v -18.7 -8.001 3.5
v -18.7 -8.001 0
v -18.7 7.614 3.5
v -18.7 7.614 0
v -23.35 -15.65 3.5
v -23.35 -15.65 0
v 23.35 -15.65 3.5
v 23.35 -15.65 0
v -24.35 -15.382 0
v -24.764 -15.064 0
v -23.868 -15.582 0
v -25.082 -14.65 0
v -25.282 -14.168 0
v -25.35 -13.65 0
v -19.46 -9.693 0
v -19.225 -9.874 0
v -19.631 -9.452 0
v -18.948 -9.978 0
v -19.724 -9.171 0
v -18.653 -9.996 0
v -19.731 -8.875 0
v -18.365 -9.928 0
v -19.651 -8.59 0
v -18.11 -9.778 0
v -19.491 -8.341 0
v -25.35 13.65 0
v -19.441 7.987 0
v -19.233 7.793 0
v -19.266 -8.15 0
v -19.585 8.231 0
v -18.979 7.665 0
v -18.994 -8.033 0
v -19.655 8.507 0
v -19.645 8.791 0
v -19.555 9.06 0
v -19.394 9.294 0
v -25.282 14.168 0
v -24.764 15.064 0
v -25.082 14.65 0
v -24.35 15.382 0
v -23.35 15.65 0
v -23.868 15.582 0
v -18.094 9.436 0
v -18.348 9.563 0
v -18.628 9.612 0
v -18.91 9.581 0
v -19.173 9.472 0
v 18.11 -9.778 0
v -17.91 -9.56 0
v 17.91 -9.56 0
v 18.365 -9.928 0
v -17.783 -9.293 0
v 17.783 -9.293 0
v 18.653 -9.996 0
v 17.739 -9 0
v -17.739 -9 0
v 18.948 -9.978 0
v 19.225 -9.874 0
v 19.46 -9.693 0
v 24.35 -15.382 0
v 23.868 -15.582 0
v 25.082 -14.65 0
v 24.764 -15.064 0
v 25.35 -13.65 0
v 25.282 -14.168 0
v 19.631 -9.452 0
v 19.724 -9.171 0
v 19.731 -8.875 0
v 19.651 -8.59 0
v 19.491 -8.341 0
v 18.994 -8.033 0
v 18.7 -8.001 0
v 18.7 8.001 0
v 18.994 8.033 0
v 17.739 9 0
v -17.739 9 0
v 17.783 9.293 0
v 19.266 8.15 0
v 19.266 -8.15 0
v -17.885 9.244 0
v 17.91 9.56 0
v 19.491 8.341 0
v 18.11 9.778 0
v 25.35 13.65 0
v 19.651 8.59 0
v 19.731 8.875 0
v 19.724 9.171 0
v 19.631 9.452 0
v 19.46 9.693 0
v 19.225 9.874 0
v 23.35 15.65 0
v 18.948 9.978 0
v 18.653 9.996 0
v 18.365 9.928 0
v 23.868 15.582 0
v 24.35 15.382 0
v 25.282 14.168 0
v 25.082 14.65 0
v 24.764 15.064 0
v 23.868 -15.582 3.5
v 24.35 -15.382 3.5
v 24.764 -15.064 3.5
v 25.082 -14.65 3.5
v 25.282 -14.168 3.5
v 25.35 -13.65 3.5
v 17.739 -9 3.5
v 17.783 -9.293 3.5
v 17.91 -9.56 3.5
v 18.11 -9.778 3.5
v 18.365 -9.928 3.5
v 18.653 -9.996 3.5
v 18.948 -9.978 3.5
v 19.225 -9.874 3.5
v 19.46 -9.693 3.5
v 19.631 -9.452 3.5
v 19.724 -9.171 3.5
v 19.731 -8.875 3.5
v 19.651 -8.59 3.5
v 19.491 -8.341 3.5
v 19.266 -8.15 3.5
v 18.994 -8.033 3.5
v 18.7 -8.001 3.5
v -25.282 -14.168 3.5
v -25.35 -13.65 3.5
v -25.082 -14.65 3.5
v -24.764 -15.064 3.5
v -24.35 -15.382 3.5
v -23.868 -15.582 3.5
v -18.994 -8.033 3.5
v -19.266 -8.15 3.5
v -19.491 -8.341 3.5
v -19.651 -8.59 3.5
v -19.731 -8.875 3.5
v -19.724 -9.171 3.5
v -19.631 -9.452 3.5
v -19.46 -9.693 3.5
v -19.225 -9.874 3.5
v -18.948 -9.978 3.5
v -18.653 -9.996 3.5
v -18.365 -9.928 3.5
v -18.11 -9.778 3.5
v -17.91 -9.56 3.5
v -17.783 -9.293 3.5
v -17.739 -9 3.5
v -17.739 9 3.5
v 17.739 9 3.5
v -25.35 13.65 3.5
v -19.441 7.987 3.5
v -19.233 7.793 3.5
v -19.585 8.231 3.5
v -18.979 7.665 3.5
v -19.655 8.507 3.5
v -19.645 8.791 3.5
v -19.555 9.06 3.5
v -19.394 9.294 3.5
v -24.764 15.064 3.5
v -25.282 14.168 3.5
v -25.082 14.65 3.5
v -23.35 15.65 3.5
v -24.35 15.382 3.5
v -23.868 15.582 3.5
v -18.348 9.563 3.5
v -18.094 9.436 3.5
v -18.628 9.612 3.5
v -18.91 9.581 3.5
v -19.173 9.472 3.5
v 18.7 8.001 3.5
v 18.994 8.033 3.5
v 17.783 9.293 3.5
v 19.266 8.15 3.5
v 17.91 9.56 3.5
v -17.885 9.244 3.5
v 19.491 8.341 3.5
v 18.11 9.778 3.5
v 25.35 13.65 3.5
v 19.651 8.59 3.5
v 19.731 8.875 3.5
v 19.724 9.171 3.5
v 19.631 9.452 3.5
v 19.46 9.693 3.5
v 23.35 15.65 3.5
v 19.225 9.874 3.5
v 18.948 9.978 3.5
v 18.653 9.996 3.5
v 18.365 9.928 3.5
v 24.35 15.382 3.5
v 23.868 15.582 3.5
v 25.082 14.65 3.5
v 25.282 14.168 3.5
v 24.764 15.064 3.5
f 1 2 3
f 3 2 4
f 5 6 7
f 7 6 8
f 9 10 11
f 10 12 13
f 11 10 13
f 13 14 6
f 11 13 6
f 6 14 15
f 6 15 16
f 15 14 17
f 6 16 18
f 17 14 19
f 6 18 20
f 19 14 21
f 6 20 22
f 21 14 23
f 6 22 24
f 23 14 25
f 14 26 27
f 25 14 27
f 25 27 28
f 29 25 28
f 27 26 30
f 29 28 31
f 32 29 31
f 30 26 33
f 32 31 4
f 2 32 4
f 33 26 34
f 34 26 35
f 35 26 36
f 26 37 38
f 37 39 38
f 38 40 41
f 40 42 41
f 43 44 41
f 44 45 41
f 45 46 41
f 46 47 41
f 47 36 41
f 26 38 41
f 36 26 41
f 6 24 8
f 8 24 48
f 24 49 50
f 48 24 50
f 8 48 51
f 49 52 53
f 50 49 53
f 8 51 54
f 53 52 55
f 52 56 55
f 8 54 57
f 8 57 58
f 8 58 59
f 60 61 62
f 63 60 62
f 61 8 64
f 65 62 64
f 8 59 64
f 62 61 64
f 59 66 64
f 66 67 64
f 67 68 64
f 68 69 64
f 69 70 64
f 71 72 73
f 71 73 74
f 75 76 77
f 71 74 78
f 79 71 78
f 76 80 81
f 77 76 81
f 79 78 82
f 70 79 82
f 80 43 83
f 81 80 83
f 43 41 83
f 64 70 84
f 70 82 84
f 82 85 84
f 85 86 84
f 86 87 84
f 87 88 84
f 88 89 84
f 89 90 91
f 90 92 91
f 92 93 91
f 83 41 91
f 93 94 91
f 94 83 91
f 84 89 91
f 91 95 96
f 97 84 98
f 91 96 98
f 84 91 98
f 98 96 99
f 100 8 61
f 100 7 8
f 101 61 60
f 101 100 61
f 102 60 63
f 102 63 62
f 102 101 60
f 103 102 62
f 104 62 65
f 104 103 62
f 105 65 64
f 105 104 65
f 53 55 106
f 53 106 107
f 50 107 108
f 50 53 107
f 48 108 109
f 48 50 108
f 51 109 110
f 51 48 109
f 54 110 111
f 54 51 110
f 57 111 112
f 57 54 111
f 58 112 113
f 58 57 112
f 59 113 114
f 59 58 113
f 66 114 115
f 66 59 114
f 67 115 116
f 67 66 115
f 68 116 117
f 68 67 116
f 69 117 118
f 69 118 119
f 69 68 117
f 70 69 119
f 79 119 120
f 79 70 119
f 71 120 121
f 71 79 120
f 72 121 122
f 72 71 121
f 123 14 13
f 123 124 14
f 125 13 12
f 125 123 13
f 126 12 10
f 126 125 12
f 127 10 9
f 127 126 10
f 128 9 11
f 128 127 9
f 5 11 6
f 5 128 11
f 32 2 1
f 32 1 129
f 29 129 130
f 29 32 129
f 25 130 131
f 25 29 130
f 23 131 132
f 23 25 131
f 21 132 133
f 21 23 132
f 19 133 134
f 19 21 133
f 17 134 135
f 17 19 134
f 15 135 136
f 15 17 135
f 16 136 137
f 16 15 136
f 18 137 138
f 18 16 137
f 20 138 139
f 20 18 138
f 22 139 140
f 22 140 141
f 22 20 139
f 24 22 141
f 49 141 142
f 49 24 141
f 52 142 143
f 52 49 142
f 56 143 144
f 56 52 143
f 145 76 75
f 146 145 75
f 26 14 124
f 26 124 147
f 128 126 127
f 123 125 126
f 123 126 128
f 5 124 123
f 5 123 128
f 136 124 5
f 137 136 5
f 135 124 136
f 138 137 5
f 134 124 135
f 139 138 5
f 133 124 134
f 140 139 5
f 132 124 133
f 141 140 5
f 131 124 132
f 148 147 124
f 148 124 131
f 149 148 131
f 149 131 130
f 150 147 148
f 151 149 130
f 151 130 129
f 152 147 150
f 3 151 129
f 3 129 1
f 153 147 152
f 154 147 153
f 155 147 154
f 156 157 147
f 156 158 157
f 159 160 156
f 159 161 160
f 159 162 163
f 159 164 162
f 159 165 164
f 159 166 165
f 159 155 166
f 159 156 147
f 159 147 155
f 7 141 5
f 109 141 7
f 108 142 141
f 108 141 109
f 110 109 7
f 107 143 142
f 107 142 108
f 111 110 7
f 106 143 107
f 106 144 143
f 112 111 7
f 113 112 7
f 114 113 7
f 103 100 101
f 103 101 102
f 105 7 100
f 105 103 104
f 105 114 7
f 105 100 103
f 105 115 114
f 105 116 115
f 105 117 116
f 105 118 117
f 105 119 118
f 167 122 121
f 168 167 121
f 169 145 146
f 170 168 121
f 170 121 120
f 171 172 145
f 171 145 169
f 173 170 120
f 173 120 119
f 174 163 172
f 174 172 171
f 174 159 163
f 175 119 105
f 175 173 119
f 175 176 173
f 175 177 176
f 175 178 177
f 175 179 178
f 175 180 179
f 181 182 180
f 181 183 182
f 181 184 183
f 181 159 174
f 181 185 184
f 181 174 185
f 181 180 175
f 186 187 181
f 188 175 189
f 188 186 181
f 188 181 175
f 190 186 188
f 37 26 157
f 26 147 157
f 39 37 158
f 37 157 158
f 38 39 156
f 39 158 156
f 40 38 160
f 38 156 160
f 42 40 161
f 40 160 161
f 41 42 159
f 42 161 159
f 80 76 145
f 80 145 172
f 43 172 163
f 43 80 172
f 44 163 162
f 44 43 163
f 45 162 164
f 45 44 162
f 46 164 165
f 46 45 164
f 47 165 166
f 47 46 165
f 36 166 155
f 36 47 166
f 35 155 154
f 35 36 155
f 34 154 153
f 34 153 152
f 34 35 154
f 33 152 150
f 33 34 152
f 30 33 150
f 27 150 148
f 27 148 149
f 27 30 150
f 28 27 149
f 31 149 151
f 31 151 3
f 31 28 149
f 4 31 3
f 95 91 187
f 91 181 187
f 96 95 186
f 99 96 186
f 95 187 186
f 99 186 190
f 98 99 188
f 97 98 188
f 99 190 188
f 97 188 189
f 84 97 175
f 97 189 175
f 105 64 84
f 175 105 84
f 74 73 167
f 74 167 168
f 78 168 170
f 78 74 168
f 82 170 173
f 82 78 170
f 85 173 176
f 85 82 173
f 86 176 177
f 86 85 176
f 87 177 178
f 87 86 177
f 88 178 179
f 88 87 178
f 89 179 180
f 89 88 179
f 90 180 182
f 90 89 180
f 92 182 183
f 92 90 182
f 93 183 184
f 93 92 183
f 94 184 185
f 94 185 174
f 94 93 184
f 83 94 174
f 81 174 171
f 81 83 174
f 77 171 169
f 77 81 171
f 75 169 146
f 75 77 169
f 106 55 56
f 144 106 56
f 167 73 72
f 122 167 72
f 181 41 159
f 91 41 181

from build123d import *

# Parameters (mm, degrees)
SKETCH_W  = 50.7
SKETCH_H  = 31.3
PAD_DEPTH = 3.5
FILLET_R  = 2


with BuildPart() as part:
    # Sketch → Pad (new body)
    with BuildSketch(Plane.XY):
        Rectangle(SKETCH_W, SKETCH_H)
        with BuildLine():
            Line((-17.738958, 9), (17.738958, 9))
            ThreePointArc((18.7, 8.000759), (19.459707, 9.693196), (17.738958, 9))
            Line((18.7, 8.000759), (18.7, -8.000759))
            ThreePointArc((17.738958, -9), (19.459707, -9.693196), (18.7, -8.000759))
            Line((17.738958, -9), (-17.738958, -9))
            ThreePointArc((-18.7, -8.000759), (-19.459707, -9.693196), (-17.738958, -9))
            Line((-18.7, -8.000759), (-18.7, 7.61377))
            ThreePointArc((-17.738958, 9), (-19.482861, 9.182759), (-18.7, 7.61377))
        make_face(mode=Mode.SUBTRACT)
    extrude(amount=PAD_DEPTH)

    # Fillet
    fillet_edges = [part.edges().sort_by_distance(p)[0] for p in [
        (25.35, 15.65, 1.75),
        (25.35, -15.65, 1.75),
        (-25.35, -15.65, 1.75),
        (-25.35, 15.65, 1.75),
    ]]
    fillet(fillet_edges, radius=FILLET_R)


solid = part.part
